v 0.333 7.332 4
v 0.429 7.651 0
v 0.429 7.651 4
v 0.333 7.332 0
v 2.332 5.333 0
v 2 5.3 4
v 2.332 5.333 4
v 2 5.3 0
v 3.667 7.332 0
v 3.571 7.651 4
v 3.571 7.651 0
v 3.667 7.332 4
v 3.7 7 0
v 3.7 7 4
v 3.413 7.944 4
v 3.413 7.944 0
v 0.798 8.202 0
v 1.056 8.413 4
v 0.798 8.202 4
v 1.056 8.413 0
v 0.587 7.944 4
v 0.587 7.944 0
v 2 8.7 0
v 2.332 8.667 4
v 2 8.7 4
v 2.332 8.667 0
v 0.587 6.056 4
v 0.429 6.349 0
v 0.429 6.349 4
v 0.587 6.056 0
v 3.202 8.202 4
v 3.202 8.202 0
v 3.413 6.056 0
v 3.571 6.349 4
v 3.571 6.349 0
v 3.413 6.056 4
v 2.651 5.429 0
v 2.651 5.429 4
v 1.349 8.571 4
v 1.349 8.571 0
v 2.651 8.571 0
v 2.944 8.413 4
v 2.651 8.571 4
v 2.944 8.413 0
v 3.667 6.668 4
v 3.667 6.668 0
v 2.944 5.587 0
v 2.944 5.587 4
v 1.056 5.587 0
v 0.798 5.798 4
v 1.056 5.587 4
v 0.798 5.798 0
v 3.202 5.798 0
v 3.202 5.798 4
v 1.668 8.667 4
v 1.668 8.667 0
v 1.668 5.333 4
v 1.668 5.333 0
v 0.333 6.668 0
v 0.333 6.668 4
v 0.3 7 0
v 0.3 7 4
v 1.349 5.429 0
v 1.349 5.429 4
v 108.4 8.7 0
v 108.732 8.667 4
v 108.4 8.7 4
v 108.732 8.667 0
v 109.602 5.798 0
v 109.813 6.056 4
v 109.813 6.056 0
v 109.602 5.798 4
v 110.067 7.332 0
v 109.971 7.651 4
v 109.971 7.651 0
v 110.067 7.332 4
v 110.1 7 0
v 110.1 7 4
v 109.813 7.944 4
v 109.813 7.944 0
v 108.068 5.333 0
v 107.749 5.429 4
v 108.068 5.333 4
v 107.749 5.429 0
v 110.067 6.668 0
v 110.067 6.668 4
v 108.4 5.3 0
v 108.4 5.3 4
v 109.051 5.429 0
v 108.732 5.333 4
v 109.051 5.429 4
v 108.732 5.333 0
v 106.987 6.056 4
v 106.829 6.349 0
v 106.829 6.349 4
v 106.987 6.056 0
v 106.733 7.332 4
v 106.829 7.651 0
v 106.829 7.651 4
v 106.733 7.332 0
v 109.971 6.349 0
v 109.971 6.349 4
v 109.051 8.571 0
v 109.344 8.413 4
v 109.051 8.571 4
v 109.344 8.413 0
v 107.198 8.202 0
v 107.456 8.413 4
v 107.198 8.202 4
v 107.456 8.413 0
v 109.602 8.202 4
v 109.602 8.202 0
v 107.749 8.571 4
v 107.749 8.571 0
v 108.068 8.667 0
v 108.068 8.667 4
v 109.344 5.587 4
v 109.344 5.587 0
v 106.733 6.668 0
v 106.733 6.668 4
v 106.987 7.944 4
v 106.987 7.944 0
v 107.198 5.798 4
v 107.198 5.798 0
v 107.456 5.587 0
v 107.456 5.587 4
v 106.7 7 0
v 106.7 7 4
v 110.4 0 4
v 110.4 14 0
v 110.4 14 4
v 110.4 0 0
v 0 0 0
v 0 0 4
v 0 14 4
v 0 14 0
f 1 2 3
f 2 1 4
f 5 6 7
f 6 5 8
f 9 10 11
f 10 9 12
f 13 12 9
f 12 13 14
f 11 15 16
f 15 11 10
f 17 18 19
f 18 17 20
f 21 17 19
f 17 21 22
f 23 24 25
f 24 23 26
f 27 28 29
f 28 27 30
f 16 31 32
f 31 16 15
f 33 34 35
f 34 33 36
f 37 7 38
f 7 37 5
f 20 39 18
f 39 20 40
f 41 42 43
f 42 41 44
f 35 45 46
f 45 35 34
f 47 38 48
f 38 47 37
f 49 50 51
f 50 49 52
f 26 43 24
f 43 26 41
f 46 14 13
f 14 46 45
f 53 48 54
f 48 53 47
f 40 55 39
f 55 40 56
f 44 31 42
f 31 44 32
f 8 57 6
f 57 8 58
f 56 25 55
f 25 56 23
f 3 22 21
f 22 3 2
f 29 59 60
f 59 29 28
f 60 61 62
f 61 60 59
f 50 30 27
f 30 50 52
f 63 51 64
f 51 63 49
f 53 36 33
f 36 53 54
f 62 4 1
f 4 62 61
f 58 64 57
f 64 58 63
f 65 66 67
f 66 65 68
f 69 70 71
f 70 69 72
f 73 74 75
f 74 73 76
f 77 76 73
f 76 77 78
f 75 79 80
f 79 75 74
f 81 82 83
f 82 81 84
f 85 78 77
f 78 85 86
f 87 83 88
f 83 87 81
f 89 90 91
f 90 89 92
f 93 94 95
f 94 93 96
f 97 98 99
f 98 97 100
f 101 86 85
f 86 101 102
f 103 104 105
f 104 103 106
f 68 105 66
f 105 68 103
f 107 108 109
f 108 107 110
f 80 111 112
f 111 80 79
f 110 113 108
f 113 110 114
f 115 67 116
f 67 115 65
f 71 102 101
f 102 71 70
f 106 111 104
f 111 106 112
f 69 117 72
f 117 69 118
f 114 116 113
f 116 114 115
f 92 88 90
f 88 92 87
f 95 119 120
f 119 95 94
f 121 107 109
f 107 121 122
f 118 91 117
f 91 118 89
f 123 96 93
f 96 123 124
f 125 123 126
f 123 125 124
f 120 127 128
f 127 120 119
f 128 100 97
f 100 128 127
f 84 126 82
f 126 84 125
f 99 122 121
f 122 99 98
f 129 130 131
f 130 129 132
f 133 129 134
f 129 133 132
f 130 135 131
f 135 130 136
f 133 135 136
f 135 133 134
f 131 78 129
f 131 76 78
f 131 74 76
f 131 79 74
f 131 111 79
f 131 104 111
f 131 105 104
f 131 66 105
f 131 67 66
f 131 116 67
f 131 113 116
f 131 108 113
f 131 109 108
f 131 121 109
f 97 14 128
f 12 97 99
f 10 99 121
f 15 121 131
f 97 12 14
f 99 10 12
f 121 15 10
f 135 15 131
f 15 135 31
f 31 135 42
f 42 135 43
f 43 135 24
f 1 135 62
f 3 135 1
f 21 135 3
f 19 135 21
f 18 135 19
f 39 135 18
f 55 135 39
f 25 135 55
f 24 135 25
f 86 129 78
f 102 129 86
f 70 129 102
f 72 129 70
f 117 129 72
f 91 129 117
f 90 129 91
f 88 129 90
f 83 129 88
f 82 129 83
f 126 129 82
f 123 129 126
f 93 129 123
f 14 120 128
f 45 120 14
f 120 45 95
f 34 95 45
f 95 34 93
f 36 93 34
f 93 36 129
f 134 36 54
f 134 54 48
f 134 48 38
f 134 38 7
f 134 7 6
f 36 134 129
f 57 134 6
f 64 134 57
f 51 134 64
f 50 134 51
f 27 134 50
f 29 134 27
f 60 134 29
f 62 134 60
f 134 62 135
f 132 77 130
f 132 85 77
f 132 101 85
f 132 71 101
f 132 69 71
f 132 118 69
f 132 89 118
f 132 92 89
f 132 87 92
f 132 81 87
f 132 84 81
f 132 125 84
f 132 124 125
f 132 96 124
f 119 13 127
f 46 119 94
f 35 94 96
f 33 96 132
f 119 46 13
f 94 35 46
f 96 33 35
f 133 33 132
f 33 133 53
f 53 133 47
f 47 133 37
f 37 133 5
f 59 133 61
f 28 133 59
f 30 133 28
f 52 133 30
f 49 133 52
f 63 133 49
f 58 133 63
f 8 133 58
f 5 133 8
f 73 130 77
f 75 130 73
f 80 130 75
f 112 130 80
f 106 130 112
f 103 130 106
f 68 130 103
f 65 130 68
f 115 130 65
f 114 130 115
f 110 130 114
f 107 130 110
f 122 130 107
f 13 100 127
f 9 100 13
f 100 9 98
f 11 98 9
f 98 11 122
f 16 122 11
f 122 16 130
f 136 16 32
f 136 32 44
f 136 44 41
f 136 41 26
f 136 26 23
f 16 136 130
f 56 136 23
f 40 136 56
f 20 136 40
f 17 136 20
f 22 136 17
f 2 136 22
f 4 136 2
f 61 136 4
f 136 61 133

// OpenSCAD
// file: params.scad
// Общие размеры первой итерации: один отсек 3.5" и детали вокруг него.
// Корпус диска — SFF-8301, таблица 3-1, класс высоты 26.10 мм (максимум).
// Положение разъёма SATA сюда не зашито: его снимают калибром gauge.scad
// с конкретного диска и только потом переносят в окно салазок.

drive_width = 101.60;
drive_height = 26.10;
drive_length = 147.00;

wall = 4.0;
floor_t = 4.0;
lip_t = 3.0;
nib = 4.0;
side_clearance = 0.8;
top_clearance = 1.5;

front_gap = 3.0;
plate_t = 8.0;
front_extra = front_gap + plate_t;

pusher_d = 4.4;
m3_clear = 3.4;
m3_pilot = 2.6;
m3_nut_af = 5.5;
m3_nut_t = 2.8;

cavity_w = drive_width + side_clearance;
outer_w = cavity_w + 2 * wall;
wall_h = drive_height + top_clearance;
body_z = drive_length + front_extra;

strap_z = 18;
strap_t = 4.0;
strap_foot = 14.0;

plate_screw_x = [14, drive_width - 14];
plate_z0 = drive_length + front_gap;
plate_screw_z = plate_z0 + plate_t / 2;
plate_bar_h = 10;
tower_w = 28;
tower_x = drive_width / 2 - tower_w / 2;

sled_w = 78;
sled_h = 48;
sled_t = 8;
sled_window_w = 50;
sled_window_h = 18;
sled_hole_inset = 6;

$fn = 32;
// main file
// Планка сверху у задней части отсека, чтобы диск не подпрыгивал.
// Садится на торцы боковых стенок. Печать — отверстиями вверх.

include <params.scad>

module strap_body() {
    difference() {
        cube([outer_w, strap_t, strap_foot]);
        for (x = [wall / 2, outer_w - wall / 2]) {
            translate([x, -0.1, strap_foot / 2])
                rotate([-90, 0, 0])
                    cylinder(h = strap_t + 0.2, d = m3_clear);
        }
    }
}

translate([0, strap_foot, 0])
    rotate([90, 0, 0])
        strap_body();
